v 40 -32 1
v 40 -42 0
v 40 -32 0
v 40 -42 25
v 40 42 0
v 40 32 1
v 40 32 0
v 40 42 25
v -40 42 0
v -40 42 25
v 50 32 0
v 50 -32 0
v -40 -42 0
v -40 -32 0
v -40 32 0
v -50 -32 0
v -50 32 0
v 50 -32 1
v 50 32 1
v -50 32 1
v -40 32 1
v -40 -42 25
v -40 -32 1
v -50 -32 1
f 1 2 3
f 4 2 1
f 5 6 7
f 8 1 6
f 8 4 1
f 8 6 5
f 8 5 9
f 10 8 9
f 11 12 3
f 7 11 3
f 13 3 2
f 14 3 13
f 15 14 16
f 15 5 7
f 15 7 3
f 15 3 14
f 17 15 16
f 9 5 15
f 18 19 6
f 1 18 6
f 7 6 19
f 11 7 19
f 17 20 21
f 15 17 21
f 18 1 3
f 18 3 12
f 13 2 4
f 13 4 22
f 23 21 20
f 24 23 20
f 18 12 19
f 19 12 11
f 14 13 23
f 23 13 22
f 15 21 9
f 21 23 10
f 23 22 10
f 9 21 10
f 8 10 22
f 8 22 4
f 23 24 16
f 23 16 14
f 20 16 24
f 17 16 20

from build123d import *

# Parameters (mm, degrees)
CROQUIS1_W              = 80
CROQUIS1_H              = 84
SALIENTE_EXTRUIR1_DEPTH = 25
CROQUIS4_W              = 10
CROQUIS4_H              = 84
SALIENTE_EXTRUIR3_DEPTH = 1
CROQUIS11_W             = 10
CROQUIS11_H             = 10
CORTAR_EXTRUIR1_DEPTH   = 1
CROQUIS8_W              = 10
CROQUIS8_H              = 10
CORTAR_EXTRUIR2_DEPTH   = 1


with BuildPart() as part:
    # Croquis1 → Saliente-Extruir1 (new body)
    with BuildSketch(Plane.XY):
        Rectangle(CROQUIS1_W, CROQUIS1_H)
    extrude(amount=SALIENTE_EXTRUIR1_DEPTH)

    # Croquis4 → Saliente-Extruir3 (add)
    with BuildSketch(Plane(origin=(0, 0, 0), x_dir=(-1, 0, 0), z_dir=(0, 0, -1))):
        with Locations((-45, 0)):
            Rectangle(CROQUIS4_W, CROQUIS4_H)
        with Locations((45, 0)):
            Rectangle(CROQUIS4_W, CROQUIS4_H)
    extrude(amount=-SALIENTE_EXTRUIR3_DEPTH)

    # Croquis11 → Cortar-Extruir1 (cut)
    with BuildSketch(Plane.XY.offset(1)):
        with Locations((-45, 37)):
            Rectangle(CROQUIS11_W, CROQUIS11_H)
        with Locations((-45, -37)):
            Rectangle(CROQUIS11_W, CROQUIS11_H)
    extrude(amount=-CORTAR_EXTRUIR1_DEPTH, mode=Mode.SUBTRACT)

    # Croquis8 → Cortar-Extruir2 (cut)
    with BuildSketch(Plane.XY.offset(1)):
        with Locations((45, 37)):
            Rectangle(CROQUIS8_W, CROQUIS8_H)
        with Locations((45, -37)):
            Rectangle(CROQUIS8_W, CROQUIS8_H)
    extrude(amount=-CORTAR_EXTRUIR2_DEPTH, mode=Mode.SUBTRACT)


solid = part.part
